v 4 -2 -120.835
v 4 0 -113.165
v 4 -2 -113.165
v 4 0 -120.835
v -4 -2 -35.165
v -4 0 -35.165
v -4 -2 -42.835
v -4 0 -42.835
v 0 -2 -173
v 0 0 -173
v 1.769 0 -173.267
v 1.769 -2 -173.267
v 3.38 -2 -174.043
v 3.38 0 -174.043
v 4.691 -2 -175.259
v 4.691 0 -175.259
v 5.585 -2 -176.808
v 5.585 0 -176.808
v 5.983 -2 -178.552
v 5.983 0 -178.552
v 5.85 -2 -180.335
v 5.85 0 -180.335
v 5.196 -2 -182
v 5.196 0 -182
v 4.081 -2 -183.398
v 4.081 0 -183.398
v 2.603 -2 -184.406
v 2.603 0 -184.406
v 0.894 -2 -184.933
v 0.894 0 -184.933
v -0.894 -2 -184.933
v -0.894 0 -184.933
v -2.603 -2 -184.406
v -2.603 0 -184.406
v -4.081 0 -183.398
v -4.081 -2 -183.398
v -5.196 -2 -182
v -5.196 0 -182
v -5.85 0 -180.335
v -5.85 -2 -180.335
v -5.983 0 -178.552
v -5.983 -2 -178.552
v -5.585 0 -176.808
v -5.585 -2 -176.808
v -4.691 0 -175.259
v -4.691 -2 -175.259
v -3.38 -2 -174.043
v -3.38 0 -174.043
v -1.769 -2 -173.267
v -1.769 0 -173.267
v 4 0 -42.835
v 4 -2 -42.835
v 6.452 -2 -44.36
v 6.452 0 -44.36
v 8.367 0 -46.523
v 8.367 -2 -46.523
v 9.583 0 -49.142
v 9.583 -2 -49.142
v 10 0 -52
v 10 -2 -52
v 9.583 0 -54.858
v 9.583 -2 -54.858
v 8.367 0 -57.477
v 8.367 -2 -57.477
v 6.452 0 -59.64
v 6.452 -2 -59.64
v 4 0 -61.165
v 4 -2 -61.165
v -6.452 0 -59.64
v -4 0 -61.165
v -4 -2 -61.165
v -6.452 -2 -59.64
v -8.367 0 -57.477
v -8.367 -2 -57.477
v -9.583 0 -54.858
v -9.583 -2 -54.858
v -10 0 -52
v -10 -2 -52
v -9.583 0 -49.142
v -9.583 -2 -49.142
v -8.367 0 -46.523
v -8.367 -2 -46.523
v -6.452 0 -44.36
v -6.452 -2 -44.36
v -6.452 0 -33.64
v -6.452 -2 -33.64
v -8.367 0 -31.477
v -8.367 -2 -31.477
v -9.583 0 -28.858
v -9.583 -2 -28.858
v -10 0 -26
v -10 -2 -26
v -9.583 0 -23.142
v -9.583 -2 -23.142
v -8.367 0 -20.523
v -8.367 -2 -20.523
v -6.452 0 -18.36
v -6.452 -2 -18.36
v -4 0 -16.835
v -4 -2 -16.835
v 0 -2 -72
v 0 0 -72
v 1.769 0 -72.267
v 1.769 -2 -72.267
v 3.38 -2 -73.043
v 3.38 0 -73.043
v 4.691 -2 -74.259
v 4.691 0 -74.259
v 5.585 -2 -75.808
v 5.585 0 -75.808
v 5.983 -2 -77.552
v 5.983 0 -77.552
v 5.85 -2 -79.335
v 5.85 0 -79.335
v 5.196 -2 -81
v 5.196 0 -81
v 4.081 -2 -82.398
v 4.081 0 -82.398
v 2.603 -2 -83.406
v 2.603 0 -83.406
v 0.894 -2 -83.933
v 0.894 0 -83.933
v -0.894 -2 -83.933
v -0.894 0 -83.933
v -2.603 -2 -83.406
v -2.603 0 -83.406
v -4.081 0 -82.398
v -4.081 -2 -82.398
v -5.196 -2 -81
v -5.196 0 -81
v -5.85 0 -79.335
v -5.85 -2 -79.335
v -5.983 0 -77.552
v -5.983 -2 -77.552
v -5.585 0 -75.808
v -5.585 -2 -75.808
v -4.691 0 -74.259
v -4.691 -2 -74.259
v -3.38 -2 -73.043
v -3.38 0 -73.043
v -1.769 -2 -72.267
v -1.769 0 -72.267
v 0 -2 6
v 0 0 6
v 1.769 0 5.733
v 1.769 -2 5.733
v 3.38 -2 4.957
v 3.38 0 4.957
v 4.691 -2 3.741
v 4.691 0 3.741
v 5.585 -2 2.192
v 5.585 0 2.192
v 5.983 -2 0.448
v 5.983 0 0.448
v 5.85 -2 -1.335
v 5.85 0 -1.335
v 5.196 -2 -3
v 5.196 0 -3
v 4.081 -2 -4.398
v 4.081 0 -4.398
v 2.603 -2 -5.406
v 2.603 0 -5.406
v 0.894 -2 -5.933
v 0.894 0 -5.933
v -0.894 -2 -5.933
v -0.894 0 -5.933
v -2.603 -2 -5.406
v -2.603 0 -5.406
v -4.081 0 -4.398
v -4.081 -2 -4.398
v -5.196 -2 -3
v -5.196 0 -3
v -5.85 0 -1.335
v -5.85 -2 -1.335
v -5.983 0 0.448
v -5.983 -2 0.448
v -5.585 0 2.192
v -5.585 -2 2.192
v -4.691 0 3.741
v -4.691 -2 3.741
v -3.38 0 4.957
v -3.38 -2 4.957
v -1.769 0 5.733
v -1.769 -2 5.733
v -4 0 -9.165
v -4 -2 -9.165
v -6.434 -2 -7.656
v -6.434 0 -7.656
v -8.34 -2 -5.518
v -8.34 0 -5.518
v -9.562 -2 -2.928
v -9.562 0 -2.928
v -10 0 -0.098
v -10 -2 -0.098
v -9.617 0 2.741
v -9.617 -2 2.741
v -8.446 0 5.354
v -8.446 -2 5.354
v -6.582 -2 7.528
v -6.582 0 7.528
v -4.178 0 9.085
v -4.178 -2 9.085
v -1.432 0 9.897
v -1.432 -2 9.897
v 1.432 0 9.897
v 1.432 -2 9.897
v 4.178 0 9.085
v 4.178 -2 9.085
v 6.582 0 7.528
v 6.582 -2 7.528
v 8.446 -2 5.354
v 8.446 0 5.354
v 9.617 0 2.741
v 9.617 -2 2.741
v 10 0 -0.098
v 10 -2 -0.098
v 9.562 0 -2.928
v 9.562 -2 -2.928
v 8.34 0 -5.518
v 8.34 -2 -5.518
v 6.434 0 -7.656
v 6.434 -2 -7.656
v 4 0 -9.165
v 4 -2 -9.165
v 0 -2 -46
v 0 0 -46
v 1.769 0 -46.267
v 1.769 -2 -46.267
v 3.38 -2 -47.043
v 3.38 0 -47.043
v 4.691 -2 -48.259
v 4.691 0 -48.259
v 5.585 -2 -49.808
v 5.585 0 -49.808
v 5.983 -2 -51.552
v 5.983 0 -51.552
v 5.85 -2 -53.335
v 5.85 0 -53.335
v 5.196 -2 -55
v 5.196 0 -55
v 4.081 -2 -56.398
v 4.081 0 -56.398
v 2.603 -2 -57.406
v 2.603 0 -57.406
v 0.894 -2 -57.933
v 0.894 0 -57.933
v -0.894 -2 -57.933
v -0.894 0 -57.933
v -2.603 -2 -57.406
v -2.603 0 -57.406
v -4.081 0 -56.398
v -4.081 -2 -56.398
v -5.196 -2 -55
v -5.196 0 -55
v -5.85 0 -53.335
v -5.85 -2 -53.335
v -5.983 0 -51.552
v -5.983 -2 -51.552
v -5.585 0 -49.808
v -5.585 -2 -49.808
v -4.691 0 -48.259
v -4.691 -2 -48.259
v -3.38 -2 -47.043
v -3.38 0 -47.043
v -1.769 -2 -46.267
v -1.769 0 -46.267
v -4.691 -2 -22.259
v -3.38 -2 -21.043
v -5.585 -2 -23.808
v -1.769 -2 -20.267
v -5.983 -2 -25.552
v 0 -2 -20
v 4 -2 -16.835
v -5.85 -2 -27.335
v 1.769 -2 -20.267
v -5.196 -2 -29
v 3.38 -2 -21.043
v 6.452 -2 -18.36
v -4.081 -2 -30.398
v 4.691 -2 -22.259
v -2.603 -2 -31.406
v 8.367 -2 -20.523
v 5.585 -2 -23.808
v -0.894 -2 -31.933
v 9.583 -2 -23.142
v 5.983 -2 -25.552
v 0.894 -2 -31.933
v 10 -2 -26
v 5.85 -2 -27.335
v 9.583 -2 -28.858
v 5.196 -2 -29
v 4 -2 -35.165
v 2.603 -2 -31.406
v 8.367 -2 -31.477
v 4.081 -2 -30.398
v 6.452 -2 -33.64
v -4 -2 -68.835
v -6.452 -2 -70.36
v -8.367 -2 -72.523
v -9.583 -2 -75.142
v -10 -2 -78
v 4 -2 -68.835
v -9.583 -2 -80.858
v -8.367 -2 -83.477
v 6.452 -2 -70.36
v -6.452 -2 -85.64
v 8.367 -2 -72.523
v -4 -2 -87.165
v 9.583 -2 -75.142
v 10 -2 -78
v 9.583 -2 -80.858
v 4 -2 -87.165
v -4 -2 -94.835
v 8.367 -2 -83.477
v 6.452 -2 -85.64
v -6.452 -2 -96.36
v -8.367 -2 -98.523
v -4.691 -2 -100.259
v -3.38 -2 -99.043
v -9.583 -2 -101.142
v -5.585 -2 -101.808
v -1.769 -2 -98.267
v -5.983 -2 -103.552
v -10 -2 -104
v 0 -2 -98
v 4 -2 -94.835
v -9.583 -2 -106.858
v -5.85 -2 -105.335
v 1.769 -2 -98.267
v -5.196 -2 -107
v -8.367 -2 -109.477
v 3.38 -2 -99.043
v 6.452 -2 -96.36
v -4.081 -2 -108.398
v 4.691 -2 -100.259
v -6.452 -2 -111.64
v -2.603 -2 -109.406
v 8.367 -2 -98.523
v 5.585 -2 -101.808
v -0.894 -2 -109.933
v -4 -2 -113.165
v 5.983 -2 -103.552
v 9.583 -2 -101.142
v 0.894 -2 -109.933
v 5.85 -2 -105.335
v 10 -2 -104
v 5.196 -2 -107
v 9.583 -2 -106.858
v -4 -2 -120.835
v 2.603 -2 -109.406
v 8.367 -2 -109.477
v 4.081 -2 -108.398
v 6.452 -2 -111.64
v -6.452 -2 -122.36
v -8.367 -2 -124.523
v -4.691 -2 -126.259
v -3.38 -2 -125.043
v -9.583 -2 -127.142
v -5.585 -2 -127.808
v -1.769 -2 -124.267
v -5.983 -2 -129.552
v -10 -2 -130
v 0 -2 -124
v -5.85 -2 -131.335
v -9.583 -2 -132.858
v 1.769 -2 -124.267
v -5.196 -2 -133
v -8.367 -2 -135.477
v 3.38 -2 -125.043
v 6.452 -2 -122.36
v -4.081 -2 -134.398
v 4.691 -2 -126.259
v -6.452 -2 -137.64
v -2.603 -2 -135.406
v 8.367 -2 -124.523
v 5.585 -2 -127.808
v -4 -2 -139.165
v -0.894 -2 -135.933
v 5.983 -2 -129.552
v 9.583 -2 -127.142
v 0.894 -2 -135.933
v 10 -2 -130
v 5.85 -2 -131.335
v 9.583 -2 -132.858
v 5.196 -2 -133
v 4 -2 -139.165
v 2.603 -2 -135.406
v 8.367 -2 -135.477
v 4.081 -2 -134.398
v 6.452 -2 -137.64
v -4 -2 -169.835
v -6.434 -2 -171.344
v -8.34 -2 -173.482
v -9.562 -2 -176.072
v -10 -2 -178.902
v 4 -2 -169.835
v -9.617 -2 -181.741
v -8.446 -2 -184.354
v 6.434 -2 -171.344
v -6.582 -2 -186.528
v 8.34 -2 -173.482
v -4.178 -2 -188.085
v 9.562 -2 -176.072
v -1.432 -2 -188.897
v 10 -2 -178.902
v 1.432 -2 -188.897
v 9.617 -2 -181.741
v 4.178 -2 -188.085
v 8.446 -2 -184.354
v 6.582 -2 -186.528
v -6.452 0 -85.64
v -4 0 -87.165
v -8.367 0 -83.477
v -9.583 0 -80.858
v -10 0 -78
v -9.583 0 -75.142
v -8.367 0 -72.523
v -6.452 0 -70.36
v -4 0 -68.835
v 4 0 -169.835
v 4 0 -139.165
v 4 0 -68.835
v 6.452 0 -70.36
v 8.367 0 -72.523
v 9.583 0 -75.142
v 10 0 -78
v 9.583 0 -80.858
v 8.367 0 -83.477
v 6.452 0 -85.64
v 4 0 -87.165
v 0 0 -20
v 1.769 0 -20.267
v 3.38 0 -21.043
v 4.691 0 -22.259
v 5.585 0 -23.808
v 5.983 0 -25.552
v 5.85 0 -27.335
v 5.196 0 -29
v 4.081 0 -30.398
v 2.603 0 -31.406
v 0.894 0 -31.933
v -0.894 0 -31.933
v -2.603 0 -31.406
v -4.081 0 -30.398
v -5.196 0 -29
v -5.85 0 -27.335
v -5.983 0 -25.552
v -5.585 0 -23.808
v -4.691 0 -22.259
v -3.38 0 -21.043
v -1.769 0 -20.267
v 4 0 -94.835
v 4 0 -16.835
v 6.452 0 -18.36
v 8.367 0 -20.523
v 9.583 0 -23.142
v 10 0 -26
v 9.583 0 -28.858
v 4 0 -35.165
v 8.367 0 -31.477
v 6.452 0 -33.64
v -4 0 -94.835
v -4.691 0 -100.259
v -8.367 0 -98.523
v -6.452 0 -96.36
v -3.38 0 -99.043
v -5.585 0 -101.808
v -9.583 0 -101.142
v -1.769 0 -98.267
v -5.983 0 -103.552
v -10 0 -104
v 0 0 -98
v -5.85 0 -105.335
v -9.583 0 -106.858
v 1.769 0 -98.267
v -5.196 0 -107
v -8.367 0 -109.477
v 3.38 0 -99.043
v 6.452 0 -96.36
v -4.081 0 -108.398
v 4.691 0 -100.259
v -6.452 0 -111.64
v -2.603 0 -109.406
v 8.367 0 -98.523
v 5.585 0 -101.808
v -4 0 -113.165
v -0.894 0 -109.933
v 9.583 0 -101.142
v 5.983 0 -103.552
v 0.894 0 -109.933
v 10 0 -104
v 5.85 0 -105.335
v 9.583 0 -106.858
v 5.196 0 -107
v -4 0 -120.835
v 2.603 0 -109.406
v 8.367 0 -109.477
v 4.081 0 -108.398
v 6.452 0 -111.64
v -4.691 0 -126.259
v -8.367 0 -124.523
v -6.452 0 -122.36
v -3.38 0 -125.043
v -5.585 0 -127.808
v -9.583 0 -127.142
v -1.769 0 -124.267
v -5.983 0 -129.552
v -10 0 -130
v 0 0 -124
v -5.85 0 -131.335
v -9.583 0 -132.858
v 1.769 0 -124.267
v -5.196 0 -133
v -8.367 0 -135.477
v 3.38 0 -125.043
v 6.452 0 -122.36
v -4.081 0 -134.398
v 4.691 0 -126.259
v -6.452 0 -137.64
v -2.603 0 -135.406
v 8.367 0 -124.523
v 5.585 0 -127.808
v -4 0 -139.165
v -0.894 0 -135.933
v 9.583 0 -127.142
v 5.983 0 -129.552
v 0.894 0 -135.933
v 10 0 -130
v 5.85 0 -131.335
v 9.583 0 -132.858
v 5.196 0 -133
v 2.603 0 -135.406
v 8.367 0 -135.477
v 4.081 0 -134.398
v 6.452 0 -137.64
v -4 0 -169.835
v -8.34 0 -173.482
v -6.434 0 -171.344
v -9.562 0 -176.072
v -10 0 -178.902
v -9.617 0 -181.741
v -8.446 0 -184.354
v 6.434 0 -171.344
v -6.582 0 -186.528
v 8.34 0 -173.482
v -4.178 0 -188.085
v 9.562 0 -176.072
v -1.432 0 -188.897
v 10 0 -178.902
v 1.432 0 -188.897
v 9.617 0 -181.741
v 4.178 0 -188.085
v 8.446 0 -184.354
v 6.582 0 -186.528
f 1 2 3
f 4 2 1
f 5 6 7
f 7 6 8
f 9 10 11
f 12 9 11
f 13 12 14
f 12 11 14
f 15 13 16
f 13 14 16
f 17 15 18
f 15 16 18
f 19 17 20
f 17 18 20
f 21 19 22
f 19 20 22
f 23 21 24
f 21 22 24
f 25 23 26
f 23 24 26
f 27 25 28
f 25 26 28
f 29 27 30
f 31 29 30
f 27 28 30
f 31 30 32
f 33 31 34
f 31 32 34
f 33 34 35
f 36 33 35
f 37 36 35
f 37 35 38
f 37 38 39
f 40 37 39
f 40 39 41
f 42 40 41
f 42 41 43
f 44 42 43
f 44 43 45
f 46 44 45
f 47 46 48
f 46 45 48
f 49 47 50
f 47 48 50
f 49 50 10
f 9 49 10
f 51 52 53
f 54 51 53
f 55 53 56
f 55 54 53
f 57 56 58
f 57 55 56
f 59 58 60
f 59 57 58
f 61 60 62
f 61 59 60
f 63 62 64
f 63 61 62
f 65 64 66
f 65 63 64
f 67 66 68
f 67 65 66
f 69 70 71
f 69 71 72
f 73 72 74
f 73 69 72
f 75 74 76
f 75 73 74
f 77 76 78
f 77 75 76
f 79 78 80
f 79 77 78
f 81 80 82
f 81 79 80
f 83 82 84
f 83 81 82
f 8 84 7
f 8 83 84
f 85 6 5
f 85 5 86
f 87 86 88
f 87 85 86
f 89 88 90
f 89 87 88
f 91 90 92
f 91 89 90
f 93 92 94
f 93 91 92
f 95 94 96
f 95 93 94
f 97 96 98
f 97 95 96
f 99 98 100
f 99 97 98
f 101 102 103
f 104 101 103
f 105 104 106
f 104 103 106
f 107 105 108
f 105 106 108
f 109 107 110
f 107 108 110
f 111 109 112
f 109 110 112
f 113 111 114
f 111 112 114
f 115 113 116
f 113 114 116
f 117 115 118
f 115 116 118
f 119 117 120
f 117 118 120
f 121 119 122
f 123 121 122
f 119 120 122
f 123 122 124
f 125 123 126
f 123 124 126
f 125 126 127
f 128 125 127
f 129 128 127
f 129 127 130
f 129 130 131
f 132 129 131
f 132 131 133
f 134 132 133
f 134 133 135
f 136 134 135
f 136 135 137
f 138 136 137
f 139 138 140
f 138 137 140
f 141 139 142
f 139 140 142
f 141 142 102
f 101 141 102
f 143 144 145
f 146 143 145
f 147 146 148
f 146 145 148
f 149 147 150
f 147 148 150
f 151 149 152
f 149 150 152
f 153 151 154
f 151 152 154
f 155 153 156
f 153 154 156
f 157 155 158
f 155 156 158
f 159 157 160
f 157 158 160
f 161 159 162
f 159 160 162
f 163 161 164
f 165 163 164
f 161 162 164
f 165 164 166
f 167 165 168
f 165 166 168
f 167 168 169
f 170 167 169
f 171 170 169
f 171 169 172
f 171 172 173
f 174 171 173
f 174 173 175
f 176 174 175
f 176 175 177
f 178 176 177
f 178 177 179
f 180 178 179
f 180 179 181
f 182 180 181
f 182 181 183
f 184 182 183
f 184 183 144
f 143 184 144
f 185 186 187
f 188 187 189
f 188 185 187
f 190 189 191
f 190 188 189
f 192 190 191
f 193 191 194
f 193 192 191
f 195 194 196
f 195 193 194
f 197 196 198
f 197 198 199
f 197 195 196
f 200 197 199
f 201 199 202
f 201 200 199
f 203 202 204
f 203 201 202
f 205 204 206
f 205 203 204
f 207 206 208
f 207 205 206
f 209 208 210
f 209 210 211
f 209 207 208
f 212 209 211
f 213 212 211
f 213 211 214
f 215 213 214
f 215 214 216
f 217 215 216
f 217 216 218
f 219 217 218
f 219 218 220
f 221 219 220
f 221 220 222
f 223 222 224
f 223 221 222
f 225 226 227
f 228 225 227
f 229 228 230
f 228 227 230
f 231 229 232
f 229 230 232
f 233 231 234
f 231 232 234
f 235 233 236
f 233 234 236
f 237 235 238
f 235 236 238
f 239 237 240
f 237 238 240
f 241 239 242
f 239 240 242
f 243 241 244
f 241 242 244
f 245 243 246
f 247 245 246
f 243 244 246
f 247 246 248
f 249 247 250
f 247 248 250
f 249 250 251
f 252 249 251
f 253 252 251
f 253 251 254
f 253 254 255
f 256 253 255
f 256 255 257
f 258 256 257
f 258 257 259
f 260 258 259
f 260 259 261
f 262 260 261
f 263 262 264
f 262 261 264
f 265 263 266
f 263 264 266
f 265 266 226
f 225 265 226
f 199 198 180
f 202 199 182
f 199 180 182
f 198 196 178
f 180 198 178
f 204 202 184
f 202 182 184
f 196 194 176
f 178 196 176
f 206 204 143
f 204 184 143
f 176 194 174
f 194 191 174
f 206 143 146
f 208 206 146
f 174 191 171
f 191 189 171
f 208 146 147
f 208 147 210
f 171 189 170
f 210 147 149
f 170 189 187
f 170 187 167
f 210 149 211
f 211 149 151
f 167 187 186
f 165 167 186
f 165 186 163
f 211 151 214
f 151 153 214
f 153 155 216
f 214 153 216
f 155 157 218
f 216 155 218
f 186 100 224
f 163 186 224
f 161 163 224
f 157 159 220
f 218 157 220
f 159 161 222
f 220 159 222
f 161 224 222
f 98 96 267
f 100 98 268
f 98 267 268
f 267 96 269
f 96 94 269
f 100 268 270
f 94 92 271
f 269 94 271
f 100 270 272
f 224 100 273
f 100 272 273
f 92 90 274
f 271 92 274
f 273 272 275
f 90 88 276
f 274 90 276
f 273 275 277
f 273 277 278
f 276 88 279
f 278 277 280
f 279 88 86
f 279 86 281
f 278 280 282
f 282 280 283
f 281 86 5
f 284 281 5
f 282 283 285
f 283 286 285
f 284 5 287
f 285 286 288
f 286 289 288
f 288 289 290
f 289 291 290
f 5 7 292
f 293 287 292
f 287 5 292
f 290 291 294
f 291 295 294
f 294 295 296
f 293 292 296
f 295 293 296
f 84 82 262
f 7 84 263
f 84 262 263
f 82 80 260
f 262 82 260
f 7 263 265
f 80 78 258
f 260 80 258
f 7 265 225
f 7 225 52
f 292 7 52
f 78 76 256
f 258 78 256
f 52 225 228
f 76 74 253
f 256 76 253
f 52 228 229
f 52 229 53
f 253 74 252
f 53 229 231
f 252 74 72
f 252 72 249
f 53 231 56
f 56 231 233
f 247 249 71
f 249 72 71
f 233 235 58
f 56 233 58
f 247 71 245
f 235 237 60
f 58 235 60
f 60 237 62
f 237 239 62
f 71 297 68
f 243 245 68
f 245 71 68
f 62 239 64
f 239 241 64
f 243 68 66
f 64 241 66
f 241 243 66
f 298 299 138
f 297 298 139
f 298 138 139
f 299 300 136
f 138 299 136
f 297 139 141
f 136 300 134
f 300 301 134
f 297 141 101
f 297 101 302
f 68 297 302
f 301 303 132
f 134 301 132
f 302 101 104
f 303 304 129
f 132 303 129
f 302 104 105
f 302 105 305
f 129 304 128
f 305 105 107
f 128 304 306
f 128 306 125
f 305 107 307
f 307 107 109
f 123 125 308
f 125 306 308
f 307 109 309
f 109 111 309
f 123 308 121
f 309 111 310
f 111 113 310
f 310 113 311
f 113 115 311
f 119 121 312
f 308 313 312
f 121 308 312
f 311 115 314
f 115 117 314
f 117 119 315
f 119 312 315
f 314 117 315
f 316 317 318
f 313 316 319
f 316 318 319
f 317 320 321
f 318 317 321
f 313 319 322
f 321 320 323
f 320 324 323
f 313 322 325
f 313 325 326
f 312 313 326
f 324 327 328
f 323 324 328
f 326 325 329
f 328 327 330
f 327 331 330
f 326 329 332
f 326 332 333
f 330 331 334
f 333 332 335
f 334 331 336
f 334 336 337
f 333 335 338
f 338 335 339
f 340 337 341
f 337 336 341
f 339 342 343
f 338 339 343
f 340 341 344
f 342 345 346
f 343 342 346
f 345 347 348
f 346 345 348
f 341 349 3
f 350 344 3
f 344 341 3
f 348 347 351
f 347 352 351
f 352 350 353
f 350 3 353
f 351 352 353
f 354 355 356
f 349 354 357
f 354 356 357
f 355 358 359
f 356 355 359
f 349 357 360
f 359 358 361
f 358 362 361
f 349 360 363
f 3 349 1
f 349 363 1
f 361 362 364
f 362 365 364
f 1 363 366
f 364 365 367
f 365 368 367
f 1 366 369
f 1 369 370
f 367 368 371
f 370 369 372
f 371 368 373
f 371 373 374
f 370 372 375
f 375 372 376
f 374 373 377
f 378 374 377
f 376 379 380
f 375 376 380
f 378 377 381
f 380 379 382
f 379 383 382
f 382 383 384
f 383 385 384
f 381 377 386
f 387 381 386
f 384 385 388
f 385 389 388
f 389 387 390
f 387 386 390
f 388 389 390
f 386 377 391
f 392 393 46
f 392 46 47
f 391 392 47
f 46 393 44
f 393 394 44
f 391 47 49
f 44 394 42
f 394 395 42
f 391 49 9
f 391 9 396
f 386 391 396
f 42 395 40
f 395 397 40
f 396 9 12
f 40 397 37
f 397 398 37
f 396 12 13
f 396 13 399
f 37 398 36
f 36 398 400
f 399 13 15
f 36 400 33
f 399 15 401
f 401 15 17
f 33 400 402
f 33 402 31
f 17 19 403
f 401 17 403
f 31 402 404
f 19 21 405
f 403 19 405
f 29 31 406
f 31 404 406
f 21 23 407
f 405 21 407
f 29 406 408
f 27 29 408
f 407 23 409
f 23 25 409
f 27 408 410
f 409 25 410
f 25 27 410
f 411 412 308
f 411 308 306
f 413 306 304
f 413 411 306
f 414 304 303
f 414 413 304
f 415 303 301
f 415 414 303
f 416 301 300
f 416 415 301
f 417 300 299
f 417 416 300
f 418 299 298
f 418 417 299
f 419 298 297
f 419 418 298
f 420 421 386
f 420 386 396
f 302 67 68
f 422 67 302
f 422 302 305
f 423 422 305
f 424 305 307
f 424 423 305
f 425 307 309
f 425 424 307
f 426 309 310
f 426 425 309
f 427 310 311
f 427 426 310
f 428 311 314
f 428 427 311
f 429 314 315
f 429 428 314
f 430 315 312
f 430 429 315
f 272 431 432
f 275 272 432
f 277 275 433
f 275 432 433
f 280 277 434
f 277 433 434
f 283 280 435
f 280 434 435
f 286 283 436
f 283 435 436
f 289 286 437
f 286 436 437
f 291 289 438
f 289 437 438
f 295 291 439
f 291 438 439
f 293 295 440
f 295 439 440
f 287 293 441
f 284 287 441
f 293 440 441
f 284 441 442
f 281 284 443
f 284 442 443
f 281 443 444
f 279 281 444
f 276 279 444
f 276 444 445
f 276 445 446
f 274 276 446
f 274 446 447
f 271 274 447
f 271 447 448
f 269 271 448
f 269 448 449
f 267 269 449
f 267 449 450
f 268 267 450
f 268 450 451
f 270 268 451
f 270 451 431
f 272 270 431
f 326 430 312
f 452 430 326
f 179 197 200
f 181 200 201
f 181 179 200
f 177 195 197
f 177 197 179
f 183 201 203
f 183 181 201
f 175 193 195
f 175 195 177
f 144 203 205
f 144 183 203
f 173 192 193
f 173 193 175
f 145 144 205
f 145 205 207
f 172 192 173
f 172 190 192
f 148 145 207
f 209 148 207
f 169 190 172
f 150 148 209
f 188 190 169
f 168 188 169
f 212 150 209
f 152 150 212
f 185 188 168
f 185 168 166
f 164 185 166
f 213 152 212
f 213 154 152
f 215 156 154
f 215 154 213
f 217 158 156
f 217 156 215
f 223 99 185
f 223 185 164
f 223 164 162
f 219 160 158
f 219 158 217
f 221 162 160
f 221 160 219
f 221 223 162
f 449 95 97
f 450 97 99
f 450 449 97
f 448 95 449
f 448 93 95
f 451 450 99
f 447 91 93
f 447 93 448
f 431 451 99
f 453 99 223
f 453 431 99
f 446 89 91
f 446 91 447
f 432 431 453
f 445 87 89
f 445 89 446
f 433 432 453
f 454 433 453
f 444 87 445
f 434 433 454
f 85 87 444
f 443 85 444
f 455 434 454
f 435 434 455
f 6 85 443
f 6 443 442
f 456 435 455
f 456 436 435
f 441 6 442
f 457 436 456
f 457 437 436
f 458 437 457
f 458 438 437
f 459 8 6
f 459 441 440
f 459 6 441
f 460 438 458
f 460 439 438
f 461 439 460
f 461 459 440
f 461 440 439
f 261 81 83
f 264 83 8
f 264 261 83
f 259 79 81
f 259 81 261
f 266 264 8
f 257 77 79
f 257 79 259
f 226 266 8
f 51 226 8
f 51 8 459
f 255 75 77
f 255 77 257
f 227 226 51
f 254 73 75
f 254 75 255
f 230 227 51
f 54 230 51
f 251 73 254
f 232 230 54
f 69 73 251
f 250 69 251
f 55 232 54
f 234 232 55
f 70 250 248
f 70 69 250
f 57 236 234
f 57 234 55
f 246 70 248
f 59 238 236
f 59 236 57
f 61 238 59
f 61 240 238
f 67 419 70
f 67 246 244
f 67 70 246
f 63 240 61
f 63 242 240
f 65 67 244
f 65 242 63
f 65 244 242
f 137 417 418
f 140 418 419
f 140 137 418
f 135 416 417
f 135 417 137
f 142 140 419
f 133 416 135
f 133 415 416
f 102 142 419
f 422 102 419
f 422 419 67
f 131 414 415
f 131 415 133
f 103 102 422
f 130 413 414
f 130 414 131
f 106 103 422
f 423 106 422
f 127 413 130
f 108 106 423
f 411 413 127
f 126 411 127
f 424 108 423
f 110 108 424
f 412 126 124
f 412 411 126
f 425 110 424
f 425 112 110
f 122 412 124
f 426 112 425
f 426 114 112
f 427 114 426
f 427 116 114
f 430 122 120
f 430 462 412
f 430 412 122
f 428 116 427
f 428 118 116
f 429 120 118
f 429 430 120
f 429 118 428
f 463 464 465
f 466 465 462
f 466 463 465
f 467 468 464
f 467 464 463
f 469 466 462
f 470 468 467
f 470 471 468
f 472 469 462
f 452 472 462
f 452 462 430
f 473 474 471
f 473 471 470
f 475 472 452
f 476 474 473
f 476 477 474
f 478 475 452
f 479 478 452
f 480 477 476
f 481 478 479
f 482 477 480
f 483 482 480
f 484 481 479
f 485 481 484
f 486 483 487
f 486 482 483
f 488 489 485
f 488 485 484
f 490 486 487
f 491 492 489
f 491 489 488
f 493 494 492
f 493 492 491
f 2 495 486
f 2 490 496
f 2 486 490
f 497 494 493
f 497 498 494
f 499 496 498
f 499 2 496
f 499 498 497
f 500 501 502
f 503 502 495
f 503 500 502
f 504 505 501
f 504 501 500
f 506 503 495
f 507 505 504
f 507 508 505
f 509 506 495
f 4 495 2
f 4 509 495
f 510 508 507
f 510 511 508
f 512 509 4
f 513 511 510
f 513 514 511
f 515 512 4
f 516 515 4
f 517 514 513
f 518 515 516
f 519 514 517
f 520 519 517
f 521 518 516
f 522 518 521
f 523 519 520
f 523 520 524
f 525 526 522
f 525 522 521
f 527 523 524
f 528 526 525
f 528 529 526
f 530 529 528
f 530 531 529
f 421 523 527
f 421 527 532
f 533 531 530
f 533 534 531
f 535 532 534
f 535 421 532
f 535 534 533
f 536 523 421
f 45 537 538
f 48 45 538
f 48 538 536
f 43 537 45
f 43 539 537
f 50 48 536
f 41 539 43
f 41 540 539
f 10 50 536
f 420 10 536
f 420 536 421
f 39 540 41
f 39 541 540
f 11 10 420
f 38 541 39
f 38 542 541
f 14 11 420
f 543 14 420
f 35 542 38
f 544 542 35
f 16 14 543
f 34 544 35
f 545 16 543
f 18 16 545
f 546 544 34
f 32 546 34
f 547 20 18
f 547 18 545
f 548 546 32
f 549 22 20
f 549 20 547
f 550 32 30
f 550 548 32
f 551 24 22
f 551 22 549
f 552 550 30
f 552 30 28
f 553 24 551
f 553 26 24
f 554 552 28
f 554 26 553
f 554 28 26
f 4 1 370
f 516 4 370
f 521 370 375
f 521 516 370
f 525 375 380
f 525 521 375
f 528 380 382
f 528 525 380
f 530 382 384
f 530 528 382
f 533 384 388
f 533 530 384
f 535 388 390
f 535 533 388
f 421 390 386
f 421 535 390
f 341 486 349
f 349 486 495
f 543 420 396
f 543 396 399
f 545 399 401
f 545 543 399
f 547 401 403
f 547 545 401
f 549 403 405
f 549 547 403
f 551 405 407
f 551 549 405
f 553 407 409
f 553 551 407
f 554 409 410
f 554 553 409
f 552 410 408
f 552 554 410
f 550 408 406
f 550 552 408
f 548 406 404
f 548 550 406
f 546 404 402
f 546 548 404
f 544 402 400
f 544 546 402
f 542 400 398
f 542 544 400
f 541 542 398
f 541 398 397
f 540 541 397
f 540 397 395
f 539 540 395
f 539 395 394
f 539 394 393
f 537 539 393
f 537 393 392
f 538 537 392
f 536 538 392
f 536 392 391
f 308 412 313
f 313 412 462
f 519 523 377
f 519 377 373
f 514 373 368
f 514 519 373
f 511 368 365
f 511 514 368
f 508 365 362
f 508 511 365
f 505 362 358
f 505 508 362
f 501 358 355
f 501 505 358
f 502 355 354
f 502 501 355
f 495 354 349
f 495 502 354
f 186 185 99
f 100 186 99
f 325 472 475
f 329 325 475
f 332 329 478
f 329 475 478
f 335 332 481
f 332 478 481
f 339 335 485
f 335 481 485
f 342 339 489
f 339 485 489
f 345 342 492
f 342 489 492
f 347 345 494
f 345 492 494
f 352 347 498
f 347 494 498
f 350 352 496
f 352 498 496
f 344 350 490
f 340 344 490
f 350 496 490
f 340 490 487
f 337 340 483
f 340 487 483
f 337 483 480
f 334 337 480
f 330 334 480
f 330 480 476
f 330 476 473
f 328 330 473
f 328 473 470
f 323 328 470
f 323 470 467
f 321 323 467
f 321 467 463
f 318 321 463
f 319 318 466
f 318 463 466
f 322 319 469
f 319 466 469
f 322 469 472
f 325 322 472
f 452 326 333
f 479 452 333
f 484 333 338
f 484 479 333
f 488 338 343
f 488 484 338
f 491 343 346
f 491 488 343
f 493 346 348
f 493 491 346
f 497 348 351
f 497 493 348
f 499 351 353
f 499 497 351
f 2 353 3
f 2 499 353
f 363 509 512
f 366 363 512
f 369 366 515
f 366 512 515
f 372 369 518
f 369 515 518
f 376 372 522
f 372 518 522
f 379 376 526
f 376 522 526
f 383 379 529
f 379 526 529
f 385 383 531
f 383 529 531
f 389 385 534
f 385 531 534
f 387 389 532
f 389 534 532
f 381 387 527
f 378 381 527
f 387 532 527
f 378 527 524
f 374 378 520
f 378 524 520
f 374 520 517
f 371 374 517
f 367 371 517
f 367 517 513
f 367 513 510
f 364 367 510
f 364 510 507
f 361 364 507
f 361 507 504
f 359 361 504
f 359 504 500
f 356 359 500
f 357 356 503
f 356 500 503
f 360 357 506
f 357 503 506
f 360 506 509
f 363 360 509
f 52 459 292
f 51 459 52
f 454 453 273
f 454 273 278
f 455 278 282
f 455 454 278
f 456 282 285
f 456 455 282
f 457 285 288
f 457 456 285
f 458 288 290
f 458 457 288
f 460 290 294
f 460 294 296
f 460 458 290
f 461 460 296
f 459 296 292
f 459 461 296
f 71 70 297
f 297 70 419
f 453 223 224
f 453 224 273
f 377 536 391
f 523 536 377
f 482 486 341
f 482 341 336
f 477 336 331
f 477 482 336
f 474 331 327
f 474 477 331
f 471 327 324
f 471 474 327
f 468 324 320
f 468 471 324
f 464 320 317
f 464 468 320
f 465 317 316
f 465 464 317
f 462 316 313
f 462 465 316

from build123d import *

# Parameters (mm, degrees)
SKETCH1_R             = 10
BASE_FLANGE1_DEPTH    = 2
SKETCH6_R             = 6
CUT_EXTRUDE1_DEPTH    = 15.282856857
SKETCH8_R             = 10
BASE_FLANGE2_DEPTH    = 2
SKETCH11_R            = 6
CUT_EXTRUDE2_DEPTH    = 38.416573868
SKETCH13_W            = 8
SKETCH13_H            = 3.83484861
TAB1_DEPTH            = 2
SKETCH16_W            = 8
SKETCH16_H            = 3.83484861
TAB2_DEPTH            = 2
SKETCH33_R            = 10
BOSS_EXTRUDE2_DEPTH   = 2
BOSS_EXTRUDE2_2_DEPTH = 2
BOSS_EXTRUDE2_3_DEPTH = 2
BOSS_EXTRUDE2_4_DEPTH = 2
BOSS_EXTRUDE2_5_DEPTH = 2
SKETCH23_W            = 8
SKETCH23_H            = 7.778071864
BOSS_EXTRUDE3_DEPTH   = 2
SKETCH41_R            = 6
CUT_EXTRUDE3_DEPTH    = 2


# Sheet-metal steps are written as plain solids
with BuildPart() as part:
    # Sketch1 → Base-Flange1 (new body)
    with BuildSketch(Plane(origin=(0, 0, 0), x_dir=(1, 0, 0), z_dir=(0, 1, 0))):
        with Locations(Location((0, 0, 0), (0, 0, 270))):
            Circle(SKETCH1_R)
    extrude(amount=-BASE_FLANGE1_DEPTH)

    # Sketch6 → Cut-Extrude1 (cut, through all)
    with BuildSketch(Plane(origin=(0, 0, 0), x_dir=(1, 0, 0), z_dir=(0, 1, 0))):
        with Locations(Location((0, 0, 0), (0, 0, 270))):
            Circle(SKETCH6_R)
    extrude(amount=-CUT_EXTRUDE1_DEPTH, mode=Mode.SUBTRACT)

    # Sketch13 → Tab1 (add)
    with BuildSketch(Plane(origin=(0, 0, 0), x_dir=(1, 0, 0), z_dir=(0, 1, 0))):
        with Locations((0, 11.082575695)):
            Rectangle(SKETCH13_W, SKETCH13_H)
    extrude(amount=-TAB1_DEPTH)



with BuildPart() as body_2:
    # Sketch8 → Base-Flange2 (new body)
    with BuildSketch(Plane(origin=(0, 0, 0), x_dir=(1, 0, 0), z_dir=(0, 1, 0))):
        with Locations(Location((0, 26, 0), (0, 0, 270))):
            Circle(SKETCH8_R)
    extrude(amount=-BASE_FLANGE2_DEPTH)

    # Sketch11 → Cut-Extrude2 (cut, through all)
    with BuildSketch(Plane(origin=(0, 0, 0), x_dir=(1, 0, 0), z_dir=(0, 1, 0))):
        with Locations(Location((0, 26, 0), (0, 0, 270))):
            Circle(SKETCH11_R)
    extrude(amount=-CUT_EXTRUDE2_DEPTH, mode=Mode.SUBTRACT)


with BuildPart() as part_1:
    add(part.part)

    add(body_2.part)  # Tab2 merges body 2
    # Sketch16 → Tab2 (add)
    with BuildSketch(Plane(origin=(0, 0, 0), x_dir=(1, 0, 0), z_dir=(0, 1, 0))):
        with Locations((0, 14.917424305)):
            Rectangle(SKETCH16_W, SKETCH16_H)
    extrude(amount=-TAB2_DEPTH)



with BuildPart() as body_2_2:
    # Sketch33 → Boss-Extrude2 (new body)
    with BuildSketch(Plane(origin=(0, 0, 0), x_dir=(1, 0, 0), z_dir=(0, 1, 0))):
        with Locations(Location((0, 52, 0), (0, 0, 270))):
            Circle(SKETCH33_R)
    extrude(amount=-BOSS_EXTRUDE2_DEPTH)


with BuildPart() as body_3:
    # Sketch33 → Boss-Extrude2 2 (new body)
    with BuildSketch(Plane(origin=(0, 0, 0), x_dir=(1, 0, 0), z_dir=(0, 1, 0))):
        with Locations(Location((0, 78, 0), (0, 0, 270))):
            Circle(SKETCH33_R)
    extrude(amount=-BOSS_EXTRUDE2_2_DEPTH)


with BuildPart() as body_4:
    # Sketch33 → Boss-Extrude2 3 (new body)
    with BuildSketch(Plane(origin=(0, 0, 0), x_dir=(1, 0, 0), z_dir=(0, 1, 0))):
        with Locations(Location((0, 104, 0), (0, 0, 270))):
            Circle(SKETCH33_R)
    extrude(amount=-BOSS_EXTRUDE2_3_DEPTH)


with BuildPart() as body_5:
    # Sketch33 → Boss-Extrude2 4 (new body)
    with BuildSketch(Plane(origin=(0, 0, 0), x_dir=(1, 0, 0), z_dir=(0, 1, 0))):
        with Locations(Location((0, 130, 0), (0, 0, 270))):
            Circle(SKETCH33_R)
    extrude(amount=-BOSS_EXTRUDE2_4_DEPTH)


with BuildPart() as body_6:
    # Sketch33 → Boss-Extrude2 5 (new body)
    with BuildSketch(Plane(origin=(0, 0, 0), x_dir=(1, 0, 0), z_dir=(0, 1, 0))):
        with Locations(Location((0, 179, 0), (0, 0, 270))):
            Circle(SKETCH33_R)
    extrude(amount=-BOSS_EXTRUDE2_5_DEPTH)


with BuildPart() as part_2:
    add(part_1.part)

    add(body_2_2.part)  # Boss-Extrude3 merges body 2 2

    add(body_3.part)  # Boss-Extrude3 merges body 3

    add(body_4.part)  # Boss-Extrude3 merges body 4

    add(body_5.part)  # Boss-Extrude3 merges body 5

    add(body_6.part)  # Boss-Extrude3 merges body 6
    # Sketch23 → Boss-Extrude3 (add)
    with BuildSketch(Plane(origin=(0, 0, 0), x_dir=(1, 0, 0), z_dir=(0, 1, 0))):
        with Locations((0, 39.054187322)):
            Rectangle(SKETCH23_W, SKETCH23_H)
        with Locations((0, 65.054187322)):
            Rectangle(SKETCH23_W, SKETCH23_H)
        with Locations((0, 91.054187322)):
            Rectangle(SKETCH23_W, SKETCH23_H)
        with Locations((0, 117.054187322)):
            Rectangle(SKETCH23_W, SKETCH23_H)
        Polygon((4, 139.16515139), (4, 146.943223254), (4, 160.16515139), (4, 169.043915681), (4, 173.041429596), (-4, 173.041429596), (-4, 169.043915681), (-4, 160.16515139), (-4, 146.943223254), (-4, 139.16515139), align=None)
    extrude(amount=-BOSS_EXTRUDE3_DEPTH)

    # Sketch41 → Cut-Extrude3 (cut)
    with BuildSketch(Plane(origin=(0, 0, 0), x_dir=(1, 0, 0), z_dir=(0, 1, 0))):
        with Locations(Location((0, 52, 0), (0, 0, 270))):
            Circle(SKETCH41_R)
        with Locations(Location((0, 78, 0), (0, 0, 270))):
            Circle(SKETCH41_R)
        with Locations(Location((0, 104, 0), (0, 0, 270))):
            Circle(SKETCH41_R)
        with Locations(Location((0, 130, 0), (0, 0, 270))):
            Circle(SKETCH41_R)
        with Locations(Location((0, 179, 0), (0, 0, 270))):
            Circle(SKETCH41_R)
    extrude(amount=-CUT_EXTRUDE3_DEPTH, mode=Mode.SUBTRACT)


solid = part_2.part
